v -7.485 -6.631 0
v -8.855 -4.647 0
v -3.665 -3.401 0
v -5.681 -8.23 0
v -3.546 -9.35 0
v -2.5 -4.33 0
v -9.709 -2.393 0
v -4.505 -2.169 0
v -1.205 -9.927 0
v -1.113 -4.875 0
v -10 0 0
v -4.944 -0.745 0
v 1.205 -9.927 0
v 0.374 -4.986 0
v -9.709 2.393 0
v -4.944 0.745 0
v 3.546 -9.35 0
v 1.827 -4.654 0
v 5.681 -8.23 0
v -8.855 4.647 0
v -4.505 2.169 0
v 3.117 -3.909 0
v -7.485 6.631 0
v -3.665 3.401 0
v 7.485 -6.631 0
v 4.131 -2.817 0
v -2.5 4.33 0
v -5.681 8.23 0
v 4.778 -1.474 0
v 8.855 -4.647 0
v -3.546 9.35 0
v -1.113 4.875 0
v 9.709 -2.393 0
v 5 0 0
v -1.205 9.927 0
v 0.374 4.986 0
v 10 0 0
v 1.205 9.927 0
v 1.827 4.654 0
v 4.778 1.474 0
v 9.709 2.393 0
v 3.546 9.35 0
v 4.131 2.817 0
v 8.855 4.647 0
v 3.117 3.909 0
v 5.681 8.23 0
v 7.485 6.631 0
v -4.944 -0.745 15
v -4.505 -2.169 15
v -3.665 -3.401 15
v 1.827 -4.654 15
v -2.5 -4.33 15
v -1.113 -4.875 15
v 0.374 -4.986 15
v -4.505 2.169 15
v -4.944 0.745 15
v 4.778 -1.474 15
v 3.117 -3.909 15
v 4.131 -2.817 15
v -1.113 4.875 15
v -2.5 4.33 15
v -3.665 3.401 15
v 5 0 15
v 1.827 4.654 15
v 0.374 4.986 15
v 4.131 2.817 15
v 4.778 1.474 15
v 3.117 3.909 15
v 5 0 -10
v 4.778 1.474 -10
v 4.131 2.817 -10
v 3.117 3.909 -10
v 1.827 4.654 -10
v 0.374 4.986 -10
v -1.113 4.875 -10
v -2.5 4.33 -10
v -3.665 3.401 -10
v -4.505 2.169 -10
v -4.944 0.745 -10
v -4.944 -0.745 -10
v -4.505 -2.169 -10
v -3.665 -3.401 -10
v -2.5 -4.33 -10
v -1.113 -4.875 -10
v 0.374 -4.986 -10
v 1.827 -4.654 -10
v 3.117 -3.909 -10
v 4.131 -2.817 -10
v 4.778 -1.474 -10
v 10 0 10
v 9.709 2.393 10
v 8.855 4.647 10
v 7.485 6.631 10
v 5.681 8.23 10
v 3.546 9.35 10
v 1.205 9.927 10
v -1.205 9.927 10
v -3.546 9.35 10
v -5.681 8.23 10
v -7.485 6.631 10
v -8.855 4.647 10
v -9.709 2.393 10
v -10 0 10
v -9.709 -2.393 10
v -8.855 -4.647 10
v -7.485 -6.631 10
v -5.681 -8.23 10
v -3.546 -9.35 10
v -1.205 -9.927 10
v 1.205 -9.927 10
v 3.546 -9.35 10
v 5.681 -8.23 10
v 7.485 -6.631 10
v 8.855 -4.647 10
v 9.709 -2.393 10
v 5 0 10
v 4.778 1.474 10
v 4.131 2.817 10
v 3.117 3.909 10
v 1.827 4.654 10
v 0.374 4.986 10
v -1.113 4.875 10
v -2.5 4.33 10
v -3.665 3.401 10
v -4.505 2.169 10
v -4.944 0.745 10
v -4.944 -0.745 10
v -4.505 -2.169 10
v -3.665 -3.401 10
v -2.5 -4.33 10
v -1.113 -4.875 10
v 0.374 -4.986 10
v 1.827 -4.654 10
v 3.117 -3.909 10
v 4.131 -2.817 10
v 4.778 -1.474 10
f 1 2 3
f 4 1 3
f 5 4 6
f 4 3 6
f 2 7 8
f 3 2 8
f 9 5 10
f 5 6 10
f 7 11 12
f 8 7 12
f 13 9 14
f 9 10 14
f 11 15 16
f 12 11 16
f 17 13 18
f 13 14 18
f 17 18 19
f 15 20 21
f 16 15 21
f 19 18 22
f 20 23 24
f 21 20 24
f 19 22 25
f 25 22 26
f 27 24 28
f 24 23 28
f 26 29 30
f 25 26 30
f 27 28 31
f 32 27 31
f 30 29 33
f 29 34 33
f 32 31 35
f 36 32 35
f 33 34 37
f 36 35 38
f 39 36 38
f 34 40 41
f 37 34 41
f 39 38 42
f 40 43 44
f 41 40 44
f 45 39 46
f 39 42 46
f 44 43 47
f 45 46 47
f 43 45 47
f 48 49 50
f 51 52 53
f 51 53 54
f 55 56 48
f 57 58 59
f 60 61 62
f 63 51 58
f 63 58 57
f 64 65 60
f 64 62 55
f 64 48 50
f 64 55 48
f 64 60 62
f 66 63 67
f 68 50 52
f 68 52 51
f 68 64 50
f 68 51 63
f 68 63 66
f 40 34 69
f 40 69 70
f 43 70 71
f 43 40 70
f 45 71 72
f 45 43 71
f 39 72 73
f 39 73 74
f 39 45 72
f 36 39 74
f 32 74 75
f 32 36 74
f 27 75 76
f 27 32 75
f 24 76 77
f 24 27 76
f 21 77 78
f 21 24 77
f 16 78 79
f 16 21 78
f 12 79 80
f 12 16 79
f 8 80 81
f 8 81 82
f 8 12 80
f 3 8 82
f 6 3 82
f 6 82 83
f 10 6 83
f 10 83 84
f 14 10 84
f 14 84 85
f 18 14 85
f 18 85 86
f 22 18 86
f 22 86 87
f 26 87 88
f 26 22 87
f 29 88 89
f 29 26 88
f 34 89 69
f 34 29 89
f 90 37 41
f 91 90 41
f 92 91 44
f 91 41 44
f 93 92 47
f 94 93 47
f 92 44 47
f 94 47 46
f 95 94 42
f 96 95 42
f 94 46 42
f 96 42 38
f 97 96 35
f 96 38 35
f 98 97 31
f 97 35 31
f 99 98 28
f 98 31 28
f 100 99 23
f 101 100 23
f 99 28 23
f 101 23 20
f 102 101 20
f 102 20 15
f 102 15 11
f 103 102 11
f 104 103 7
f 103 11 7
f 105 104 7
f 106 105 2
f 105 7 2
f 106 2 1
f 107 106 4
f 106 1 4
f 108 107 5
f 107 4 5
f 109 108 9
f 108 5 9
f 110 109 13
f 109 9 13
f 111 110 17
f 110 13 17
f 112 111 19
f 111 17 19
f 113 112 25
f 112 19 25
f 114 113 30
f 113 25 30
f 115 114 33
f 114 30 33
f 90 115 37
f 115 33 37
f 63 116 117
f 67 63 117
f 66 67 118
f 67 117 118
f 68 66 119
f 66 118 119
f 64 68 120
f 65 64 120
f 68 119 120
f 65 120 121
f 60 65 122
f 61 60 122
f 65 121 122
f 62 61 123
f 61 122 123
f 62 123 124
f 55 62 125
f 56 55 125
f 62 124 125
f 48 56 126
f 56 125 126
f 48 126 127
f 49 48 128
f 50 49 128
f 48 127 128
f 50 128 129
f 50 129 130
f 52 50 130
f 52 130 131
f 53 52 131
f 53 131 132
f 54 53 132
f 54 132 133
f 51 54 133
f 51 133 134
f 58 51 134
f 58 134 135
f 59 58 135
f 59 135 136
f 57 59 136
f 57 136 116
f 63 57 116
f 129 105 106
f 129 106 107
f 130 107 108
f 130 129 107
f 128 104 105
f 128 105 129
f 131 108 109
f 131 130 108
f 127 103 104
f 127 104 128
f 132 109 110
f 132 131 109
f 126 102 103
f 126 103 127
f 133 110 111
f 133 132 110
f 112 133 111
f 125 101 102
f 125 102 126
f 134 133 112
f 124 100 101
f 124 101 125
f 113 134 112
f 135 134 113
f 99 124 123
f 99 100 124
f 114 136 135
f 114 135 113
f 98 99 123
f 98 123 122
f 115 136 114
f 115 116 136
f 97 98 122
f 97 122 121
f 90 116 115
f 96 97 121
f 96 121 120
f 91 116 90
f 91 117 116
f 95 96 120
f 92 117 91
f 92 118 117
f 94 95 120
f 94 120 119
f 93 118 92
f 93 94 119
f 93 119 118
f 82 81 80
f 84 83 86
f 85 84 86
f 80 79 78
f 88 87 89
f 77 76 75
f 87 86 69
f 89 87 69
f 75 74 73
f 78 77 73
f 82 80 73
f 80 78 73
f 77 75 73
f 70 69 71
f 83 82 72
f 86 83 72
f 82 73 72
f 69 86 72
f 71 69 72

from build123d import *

# Parameters (mm, degrees)
F0_R     = 10
F1_DEPTH = 10
F2_R     = 5
F3_DEPTH = 15
F4_DEPTH = 10


with BuildPart() as f1:
    # F0 (on Top) → F1 (new body)
    with BuildSketch(Plane.XY):
        Circle(F0_R)
    extrude(amount=F1_DEPTH)

    # F2 (on Top) → F3 (join)
    with BuildSketch(Plane.XY):
        Circle(F2_R)
    extrude(amount=F3_DEPTH)

    # F2 (on Top) → F4 (join)
    with BuildSketch(Plane.XY):
        Circle(F2_R)
    extrude(amount=-F4_DEPTH)


solid = f1.part
